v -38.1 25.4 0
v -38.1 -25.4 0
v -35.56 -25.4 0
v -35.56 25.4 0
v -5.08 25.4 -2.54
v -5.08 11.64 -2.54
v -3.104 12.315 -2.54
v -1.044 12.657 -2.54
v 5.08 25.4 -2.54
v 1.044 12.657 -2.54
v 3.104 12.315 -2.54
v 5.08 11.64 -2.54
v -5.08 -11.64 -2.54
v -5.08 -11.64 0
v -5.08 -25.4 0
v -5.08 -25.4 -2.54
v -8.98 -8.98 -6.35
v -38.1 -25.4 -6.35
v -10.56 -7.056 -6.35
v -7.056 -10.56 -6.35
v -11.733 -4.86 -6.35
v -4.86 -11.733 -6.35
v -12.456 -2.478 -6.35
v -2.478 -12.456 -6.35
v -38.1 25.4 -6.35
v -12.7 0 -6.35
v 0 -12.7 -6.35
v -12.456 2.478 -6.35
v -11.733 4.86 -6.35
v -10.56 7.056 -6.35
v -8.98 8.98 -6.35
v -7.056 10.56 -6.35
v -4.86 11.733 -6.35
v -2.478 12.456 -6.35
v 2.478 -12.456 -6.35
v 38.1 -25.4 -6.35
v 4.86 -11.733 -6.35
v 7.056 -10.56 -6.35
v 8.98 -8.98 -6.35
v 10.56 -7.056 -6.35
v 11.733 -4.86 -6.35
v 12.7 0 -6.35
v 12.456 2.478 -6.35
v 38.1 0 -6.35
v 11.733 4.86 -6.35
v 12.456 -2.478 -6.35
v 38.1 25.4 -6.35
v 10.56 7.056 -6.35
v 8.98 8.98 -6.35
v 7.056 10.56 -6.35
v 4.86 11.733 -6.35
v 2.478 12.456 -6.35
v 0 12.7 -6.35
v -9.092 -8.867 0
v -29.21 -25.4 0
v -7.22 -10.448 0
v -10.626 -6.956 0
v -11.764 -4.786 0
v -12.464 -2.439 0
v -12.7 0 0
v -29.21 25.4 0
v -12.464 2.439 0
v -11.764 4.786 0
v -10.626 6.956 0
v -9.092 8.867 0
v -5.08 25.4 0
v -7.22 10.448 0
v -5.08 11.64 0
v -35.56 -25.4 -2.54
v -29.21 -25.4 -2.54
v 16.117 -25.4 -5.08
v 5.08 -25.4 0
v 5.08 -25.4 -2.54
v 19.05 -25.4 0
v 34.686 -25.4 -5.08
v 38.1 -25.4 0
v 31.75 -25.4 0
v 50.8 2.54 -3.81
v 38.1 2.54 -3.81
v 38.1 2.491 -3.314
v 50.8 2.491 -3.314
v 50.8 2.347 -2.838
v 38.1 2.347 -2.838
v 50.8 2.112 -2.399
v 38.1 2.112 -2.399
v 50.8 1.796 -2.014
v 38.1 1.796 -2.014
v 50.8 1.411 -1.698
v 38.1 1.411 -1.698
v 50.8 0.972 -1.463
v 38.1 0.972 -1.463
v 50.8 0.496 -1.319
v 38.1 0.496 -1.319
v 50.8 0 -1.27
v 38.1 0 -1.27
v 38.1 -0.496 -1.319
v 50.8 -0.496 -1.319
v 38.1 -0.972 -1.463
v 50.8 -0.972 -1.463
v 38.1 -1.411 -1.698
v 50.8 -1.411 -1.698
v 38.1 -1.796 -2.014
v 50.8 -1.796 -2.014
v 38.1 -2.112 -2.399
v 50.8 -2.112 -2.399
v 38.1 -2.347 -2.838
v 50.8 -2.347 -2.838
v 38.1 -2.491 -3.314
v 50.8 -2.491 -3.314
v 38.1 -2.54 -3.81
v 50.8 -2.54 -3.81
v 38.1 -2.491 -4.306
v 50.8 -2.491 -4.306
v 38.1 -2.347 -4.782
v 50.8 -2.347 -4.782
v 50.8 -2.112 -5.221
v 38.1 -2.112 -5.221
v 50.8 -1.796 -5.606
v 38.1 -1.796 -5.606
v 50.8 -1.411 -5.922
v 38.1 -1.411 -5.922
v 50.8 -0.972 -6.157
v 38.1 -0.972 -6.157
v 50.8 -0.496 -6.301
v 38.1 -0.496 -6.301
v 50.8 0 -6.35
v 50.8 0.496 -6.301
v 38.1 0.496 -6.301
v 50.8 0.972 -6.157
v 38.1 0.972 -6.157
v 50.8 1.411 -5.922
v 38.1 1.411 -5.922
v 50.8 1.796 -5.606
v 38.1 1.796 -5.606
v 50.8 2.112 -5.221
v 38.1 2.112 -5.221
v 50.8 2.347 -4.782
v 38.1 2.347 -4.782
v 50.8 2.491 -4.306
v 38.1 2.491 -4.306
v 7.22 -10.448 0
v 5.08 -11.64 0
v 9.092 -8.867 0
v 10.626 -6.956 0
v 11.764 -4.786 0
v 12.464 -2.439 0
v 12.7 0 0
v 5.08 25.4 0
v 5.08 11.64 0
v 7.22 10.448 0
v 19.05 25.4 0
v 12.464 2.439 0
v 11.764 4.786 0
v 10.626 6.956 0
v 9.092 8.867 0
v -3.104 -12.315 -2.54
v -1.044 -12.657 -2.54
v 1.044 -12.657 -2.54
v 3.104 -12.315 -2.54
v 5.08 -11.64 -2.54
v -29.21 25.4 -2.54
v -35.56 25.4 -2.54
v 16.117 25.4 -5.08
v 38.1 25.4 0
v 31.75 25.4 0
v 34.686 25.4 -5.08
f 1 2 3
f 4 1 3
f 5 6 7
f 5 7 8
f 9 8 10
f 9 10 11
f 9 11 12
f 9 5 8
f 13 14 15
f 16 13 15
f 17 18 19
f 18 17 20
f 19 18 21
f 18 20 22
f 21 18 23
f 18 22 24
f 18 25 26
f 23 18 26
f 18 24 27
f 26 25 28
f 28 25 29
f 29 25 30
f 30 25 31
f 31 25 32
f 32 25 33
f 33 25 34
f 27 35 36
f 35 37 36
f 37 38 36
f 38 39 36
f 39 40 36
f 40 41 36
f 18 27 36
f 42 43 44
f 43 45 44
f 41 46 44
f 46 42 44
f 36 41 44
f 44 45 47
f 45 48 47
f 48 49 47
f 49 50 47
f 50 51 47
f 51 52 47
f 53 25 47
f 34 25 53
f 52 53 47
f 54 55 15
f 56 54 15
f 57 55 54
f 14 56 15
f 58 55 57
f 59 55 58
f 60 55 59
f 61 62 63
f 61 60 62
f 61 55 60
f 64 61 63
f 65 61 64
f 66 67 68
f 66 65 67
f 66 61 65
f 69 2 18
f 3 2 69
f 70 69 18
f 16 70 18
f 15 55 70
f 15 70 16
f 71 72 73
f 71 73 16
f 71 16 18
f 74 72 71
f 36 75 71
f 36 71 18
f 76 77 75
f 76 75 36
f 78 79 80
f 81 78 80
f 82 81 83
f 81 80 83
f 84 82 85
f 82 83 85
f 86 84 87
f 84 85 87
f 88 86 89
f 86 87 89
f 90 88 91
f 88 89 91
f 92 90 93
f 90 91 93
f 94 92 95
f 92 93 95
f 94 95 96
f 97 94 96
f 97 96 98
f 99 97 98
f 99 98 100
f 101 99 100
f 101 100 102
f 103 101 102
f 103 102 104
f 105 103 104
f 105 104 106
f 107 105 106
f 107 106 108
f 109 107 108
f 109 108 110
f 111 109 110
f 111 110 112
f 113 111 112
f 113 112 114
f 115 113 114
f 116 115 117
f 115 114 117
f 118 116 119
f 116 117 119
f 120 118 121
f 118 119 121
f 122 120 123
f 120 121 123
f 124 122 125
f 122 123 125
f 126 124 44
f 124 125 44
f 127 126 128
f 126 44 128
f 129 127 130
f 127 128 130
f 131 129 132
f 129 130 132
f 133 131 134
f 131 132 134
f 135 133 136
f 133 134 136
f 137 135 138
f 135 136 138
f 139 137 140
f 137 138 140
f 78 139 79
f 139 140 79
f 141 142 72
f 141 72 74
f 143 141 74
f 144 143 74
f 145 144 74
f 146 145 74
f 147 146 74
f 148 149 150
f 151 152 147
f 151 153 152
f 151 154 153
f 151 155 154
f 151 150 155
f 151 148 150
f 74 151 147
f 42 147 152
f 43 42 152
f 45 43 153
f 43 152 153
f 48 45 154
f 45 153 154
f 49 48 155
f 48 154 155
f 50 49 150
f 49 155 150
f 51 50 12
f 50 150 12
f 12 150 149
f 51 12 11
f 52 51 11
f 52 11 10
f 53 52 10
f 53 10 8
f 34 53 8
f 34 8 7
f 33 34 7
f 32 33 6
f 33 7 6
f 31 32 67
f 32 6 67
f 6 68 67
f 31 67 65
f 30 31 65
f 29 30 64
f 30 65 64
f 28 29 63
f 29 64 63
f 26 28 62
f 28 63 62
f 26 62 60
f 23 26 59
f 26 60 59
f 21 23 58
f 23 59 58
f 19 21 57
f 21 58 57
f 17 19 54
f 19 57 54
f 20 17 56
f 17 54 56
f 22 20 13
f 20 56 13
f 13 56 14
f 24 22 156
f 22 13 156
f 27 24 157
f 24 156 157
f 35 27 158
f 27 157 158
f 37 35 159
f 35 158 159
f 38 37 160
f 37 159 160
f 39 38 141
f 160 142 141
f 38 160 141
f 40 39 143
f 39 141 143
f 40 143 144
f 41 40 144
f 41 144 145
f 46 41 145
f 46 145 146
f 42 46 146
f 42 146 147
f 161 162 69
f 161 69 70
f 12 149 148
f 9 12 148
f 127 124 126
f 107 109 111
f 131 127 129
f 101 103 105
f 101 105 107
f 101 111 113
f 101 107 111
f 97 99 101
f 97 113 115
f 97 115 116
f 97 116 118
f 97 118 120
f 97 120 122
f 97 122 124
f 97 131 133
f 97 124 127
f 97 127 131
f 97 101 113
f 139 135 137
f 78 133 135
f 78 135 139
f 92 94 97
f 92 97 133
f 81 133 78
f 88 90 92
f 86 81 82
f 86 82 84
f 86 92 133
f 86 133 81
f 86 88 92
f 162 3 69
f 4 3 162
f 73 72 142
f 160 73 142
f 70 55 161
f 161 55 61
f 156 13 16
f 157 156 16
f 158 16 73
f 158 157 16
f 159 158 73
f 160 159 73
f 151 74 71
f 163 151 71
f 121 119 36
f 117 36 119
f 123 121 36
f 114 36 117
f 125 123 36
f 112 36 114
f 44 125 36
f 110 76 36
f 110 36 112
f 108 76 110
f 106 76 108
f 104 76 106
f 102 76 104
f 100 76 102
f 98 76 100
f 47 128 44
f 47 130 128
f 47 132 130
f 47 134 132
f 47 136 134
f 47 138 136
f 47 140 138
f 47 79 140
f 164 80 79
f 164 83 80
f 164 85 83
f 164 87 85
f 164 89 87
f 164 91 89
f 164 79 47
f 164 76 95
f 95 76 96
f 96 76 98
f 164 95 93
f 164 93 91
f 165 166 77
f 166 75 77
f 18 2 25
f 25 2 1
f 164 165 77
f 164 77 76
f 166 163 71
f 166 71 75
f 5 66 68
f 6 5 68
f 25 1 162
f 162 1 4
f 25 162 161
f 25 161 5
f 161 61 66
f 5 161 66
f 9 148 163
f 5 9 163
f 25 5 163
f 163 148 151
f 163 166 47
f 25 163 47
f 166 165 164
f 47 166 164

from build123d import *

# Parameters (mm, degrees)
F0_W     = 76.2
F0_H     = 50.8
F0_R     = 12.7
F1_DEPTH = 6.35
F2_W     = 6.35
F2_H     = 50.8
F3_DEPTH = 2.54
F5_DEPTH = 25.4
F6_R     = 2.54
F7_DEPTH = 12.7


# Not quite as in the source:
# - a feature names something its author has since deleted; it is built from what else it names


with BuildPart() as f1:
    # F0 (on Top) → F1 (new body)
    with BuildSketch(Plane.XY):
        Rectangle(F0_W, F0_H)
        Circle(F0_R, mode=Mode.SUBTRACT)
    extrude(amount=-F1_DEPTH)

    # F2 (on face) → F3 (cut)
    with BuildSketch(Plane.XY):
        with Locations((-32.385, 0)):
            Rectangle(F2_W, F2_H)
        with BuildLine():
            Line((-5.08, -11.6397422652), (-5.08, -25.4))
            Line((-5.08, -25.4), (5.08, -25.4))
            Line((5.08, -25.4), (5.08, -11.6397422652))
            ThreePointArc((5.08, -11.6397422652), (0, -12.7), (-5.08, -11.6397422652))
        make_face()
        with BuildLine():
            Line((5.08, 25.4), (-5.08, 25.4))
            Line((-5.08, 25.4), (-5.08, 11.6397422652))
            ThreePointArc((-5.08, 11.6397422652), (0, 12.7), (5.08, 11.6397422652))
            Line((5.08, 11.6397422652), (5.08, 25.4))
        make_face()
    extrude(amount=-F3_DEPTH, mode=Mode.SUBTRACT)

    # F4 (on Front) → F5 (cut, symmetric)
    with BuildSketch(Plane.XZ):
        Polygon((31.75, 0), (19.05, 0), (16.1170606325, -5.08), (34.6859807152, -5.08), align=None)
    extrude(amount=F5_DEPTH, both=True, mode=Mode.SUBTRACT)

    # F6 (on face) → F7 (join)
    with BuildSketch(Plane.YZ.offset(38.1)):
        with Locations((0, -3.81)):
            Circle(F6_R)
    extrude(amount=F7_DEPTH)


solid = f1.part
